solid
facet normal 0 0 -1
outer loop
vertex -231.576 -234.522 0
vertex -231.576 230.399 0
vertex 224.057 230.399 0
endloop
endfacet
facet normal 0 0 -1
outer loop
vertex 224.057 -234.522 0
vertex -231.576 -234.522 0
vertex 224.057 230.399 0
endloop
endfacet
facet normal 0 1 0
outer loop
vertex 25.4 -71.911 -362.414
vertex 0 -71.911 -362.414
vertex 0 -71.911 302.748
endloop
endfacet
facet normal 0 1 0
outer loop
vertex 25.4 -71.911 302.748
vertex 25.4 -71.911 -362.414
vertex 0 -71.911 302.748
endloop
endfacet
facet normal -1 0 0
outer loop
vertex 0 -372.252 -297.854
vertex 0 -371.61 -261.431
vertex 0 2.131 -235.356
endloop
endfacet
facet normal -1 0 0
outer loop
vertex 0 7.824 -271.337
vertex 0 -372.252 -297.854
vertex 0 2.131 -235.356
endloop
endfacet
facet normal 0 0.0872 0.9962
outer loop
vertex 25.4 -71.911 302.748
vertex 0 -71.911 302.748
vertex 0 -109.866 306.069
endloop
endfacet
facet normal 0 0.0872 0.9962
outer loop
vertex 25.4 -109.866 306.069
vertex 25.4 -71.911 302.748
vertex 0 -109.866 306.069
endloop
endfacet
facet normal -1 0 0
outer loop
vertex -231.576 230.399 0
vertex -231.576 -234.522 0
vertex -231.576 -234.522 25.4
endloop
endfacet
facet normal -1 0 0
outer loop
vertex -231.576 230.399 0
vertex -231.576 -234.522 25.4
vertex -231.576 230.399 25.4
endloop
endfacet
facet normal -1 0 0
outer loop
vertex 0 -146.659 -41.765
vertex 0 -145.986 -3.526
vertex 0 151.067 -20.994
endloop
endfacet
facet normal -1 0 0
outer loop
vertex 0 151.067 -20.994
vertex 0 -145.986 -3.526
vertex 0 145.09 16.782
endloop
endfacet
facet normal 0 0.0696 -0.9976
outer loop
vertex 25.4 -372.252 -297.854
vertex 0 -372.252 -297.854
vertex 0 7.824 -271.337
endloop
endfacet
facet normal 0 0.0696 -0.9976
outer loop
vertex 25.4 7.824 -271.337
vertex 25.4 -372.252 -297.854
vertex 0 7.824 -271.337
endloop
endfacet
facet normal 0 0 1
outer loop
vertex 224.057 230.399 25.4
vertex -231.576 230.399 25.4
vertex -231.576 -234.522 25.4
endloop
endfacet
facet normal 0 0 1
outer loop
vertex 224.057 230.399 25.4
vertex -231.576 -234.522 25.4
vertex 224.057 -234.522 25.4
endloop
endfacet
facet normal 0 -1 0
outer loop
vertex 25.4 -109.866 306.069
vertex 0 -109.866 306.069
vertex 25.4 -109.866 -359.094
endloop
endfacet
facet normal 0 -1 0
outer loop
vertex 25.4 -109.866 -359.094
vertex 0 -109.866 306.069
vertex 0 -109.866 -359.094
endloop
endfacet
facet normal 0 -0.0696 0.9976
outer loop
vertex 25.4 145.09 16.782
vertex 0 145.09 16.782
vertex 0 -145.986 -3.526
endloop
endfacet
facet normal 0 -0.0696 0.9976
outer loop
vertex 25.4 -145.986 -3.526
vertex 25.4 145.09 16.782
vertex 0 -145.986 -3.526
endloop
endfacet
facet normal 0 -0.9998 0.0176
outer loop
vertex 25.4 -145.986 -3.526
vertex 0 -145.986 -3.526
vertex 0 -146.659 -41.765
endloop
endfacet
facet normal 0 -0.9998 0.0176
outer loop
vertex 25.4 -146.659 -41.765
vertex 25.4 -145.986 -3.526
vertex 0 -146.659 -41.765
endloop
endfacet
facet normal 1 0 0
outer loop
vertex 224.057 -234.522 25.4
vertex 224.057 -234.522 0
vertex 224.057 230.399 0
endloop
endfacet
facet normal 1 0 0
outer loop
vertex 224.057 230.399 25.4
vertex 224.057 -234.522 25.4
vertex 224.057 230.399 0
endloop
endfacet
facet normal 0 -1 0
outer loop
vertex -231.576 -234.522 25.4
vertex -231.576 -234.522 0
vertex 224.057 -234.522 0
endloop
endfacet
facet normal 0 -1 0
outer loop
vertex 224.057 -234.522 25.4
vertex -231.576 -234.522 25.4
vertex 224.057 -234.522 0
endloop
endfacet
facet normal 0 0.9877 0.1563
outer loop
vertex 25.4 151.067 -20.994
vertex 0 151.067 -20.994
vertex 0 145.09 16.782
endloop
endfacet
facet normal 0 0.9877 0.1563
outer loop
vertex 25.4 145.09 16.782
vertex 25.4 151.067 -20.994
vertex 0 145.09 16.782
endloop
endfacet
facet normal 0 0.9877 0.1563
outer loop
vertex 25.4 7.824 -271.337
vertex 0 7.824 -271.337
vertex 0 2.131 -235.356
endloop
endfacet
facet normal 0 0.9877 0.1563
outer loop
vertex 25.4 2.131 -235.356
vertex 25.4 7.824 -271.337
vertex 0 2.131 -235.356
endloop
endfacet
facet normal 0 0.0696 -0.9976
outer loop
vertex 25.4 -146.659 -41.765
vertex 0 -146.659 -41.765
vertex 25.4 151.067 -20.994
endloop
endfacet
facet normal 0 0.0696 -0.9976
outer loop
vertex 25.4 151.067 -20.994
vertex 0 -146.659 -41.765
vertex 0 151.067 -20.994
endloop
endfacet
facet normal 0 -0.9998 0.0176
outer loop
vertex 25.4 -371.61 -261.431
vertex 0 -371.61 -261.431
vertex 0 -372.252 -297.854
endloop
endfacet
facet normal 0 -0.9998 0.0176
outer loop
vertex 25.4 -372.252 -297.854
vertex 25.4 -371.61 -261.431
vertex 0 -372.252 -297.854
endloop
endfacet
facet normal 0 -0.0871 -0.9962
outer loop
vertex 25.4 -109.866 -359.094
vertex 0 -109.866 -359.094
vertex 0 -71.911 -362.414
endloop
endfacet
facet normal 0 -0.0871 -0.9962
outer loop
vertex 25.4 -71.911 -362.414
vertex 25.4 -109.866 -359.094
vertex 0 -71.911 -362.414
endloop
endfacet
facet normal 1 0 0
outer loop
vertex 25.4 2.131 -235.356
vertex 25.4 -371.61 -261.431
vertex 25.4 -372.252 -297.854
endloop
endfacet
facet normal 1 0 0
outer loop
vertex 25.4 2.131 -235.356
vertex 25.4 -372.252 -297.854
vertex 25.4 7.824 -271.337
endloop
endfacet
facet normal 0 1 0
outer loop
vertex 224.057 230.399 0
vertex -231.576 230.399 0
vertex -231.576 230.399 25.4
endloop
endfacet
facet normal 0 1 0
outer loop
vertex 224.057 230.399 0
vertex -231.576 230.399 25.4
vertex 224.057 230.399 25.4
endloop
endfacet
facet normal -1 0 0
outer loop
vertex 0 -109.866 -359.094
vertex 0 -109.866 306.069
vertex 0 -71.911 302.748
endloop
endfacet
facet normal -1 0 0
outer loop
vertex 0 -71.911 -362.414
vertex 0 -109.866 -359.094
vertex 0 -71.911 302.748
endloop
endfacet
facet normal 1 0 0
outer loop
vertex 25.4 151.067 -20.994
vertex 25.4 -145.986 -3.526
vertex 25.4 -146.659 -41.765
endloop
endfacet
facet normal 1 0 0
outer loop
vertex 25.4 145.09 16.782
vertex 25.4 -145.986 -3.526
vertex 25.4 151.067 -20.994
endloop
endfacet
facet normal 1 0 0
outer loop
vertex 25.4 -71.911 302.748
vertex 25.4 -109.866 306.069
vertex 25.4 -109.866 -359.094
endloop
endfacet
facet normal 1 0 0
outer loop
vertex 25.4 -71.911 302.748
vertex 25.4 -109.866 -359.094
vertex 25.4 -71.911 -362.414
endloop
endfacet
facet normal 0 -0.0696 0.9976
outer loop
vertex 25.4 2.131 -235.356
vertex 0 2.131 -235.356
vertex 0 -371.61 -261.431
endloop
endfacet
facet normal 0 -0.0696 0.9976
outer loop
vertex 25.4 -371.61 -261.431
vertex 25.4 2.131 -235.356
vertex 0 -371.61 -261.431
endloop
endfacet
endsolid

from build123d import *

# Parameters (mm, degrees)
F1_DEPTH = 25.4
F2_W     = 455.63227
F2_H     = 464.921206
F3_DEPTH = 25.4
F5_DEPTH = 25.4
F7_DEPTH = 25.4


with BuildPart() as f1:
    # F0 (on Right) → F1 (new body)
    with BuildSketch(Plane.YZ):
        Polygon((-71.910563, 302.748341), (-109.865581, 306.068975), (-109.865581, -359.093525), (-71.910563, -362.414159), (-71.910563, 256.125829), align=None)
    extrude(amount=F1_DEPTH)


with BuildPart() as f3:
    # F2 (on Top) → F3 (new body)
    with BuildSketch(Plane.XY):
        with Locations((-3.759533, -2.061322)):
            Rectangle(F2_W, F2_H)
    extrude(amount=F3_DEPTH)


with BuildPart() as f5:
    # F4 (on face) → F5 (new body)
    with BuildSketch(Plane.YZ):
        Polygon((7.824159, -271.337298), (2.131104, -235.355858), (-371.610405, -261.430885), (-372.251952, -297.854275), align=None)
    extrude(amount=F5_DEPTH)


with BuildPart() as f7:
    # F6 (on Right) → F7 (new body)
    with BuildSketch(Plane.YZ):
        Polygon((151.066989, -20.993726), (145.090056, 16.781892), (-145.98576, -3.525753), (-146.659298, -41.765357), align=None)
    extrude(amount=F7_DEPTH)


solid = Compound([f1.part, f3.part, f5.part, f7.part])
